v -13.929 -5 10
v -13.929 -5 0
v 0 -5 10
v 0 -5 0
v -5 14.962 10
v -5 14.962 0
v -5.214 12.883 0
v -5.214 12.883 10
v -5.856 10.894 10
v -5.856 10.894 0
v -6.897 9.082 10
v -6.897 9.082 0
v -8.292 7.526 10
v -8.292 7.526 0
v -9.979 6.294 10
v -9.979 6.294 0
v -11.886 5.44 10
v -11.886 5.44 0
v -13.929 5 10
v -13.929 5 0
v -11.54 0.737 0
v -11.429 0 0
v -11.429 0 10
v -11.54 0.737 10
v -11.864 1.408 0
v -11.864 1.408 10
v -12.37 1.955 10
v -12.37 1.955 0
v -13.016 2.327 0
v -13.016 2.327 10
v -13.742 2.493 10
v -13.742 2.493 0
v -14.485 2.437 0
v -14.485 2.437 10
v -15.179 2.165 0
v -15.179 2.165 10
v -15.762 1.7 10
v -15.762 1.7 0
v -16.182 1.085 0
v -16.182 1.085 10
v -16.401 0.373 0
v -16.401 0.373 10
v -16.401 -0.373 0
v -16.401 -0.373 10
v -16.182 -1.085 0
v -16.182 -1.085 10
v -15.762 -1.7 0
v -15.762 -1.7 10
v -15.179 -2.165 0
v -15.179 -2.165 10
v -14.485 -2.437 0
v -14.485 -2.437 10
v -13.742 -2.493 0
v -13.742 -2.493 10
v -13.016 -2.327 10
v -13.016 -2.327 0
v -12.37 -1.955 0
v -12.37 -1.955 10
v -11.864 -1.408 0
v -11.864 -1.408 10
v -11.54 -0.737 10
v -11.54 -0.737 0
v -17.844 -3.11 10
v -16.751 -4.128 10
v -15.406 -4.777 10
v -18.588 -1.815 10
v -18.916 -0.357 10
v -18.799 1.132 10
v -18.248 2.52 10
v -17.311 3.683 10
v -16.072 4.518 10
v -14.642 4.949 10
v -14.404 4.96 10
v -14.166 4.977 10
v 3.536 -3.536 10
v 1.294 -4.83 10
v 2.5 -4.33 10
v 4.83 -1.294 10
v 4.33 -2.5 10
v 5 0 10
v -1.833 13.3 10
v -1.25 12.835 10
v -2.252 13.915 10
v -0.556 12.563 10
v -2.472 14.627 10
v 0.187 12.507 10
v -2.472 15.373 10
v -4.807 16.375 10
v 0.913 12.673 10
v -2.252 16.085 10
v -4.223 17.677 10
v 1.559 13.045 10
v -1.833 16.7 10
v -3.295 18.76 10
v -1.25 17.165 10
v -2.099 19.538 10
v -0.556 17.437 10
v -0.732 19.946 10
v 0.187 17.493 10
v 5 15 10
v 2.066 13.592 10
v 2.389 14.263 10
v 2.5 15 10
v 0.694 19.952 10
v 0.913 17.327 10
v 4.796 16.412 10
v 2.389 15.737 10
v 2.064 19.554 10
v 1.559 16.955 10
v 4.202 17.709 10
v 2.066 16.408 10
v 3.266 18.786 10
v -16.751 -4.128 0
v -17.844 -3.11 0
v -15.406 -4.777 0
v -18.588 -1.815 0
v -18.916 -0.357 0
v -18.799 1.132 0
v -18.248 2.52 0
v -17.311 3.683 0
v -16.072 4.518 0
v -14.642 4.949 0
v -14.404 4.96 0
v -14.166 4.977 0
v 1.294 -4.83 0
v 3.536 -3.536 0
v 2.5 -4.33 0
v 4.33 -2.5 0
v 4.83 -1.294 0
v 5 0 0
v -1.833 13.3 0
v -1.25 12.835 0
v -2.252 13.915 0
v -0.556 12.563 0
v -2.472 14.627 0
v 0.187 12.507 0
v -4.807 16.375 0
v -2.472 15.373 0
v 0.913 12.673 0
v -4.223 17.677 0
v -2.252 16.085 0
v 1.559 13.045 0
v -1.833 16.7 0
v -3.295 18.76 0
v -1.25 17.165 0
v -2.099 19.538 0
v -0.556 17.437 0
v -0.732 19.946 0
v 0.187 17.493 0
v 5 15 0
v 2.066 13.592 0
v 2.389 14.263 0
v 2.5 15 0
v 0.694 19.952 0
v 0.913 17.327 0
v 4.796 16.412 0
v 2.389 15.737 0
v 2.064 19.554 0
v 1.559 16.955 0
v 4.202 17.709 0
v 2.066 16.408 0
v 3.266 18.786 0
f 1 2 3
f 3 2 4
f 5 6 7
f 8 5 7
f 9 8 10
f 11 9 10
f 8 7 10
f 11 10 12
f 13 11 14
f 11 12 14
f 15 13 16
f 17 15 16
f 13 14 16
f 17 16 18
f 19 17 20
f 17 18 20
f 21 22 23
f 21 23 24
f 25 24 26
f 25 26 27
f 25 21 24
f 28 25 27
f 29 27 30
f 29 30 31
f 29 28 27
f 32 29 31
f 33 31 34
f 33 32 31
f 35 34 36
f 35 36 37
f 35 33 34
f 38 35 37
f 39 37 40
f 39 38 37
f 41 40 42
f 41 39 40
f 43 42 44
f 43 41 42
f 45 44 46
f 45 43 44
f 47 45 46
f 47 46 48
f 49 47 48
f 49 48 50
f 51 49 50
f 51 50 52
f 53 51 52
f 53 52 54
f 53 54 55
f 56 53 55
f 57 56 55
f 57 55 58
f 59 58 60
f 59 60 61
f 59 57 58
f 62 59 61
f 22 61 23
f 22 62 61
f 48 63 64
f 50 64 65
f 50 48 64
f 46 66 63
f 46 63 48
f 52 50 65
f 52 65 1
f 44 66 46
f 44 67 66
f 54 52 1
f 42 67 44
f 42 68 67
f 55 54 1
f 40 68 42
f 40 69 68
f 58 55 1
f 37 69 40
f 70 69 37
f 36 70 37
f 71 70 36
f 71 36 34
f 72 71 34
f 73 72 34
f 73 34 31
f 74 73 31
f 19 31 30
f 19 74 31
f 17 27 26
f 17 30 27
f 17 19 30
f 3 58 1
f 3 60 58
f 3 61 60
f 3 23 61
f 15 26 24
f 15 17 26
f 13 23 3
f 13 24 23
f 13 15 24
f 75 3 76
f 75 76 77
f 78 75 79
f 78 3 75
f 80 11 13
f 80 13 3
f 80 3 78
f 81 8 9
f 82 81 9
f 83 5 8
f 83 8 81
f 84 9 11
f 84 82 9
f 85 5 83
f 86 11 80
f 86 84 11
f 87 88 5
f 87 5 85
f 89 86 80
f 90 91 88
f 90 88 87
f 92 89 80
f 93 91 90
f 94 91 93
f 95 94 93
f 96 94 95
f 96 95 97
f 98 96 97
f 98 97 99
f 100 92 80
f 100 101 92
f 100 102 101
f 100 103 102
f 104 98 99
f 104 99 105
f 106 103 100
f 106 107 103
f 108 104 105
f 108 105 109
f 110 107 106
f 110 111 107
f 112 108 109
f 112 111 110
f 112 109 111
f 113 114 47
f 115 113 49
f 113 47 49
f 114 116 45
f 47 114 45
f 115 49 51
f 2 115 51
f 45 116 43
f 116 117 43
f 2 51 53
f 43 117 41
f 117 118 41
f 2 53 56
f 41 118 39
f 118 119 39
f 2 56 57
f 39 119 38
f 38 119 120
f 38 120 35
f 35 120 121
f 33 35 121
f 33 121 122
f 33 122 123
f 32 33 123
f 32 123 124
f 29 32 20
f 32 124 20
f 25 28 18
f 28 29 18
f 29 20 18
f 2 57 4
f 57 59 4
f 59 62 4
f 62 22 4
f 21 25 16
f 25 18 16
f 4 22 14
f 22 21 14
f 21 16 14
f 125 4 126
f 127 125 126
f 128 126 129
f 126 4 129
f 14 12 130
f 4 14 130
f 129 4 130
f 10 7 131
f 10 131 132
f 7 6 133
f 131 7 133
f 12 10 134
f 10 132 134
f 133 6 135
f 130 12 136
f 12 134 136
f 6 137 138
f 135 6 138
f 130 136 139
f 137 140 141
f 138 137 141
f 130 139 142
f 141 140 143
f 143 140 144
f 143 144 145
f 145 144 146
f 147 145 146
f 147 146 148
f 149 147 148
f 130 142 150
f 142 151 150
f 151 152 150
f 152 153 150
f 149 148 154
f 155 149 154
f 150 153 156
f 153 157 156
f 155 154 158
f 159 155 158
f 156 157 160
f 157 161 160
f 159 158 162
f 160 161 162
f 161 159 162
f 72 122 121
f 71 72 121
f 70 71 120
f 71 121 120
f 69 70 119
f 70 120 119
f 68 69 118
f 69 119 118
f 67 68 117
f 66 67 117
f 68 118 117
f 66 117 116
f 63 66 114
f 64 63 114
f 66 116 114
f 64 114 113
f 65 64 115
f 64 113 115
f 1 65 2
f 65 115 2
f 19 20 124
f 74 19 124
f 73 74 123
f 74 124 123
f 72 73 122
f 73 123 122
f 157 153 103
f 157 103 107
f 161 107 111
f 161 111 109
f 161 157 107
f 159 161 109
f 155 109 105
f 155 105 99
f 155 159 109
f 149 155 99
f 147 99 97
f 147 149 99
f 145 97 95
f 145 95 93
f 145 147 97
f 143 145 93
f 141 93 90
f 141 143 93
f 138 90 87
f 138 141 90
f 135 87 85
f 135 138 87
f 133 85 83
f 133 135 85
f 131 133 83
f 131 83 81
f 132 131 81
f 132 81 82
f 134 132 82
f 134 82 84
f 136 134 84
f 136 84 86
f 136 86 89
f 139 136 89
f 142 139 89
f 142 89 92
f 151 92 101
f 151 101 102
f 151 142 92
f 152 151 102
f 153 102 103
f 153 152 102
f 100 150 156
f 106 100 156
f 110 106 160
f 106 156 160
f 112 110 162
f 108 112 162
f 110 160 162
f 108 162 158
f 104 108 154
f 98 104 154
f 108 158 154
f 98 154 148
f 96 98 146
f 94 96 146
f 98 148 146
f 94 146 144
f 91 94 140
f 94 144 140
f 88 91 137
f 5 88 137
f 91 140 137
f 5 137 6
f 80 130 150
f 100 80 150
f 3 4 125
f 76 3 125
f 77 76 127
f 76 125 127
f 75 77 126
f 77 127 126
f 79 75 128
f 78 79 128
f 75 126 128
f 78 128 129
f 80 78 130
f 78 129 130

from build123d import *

# Parameters (mm, degrees)
F0_R     = 2.5
F1_DEPTH = 10


with BuildPart() as f1:
    # F0 (on Top) → F1 (new body)
    with BuildSketch(Plane.XY):
        with BuildLine():
            ThreePointArc((0, -5), (-3.5355339059, 3.5355339059), (5, 0))
            Line((5, 0), (5, 15))
            ThreePointArc((5, 15), (0, 10), (-5, 15))
            ThreePointArc((-5, 15), (-7.5406677948, 8.2821226215), (-13.9291371274, 5))
            ThreePointArc((-13.9291371274, 5), (-10.3936032215, 3.5355339059), (-8.9291371274, 0))
            ThreePointArc((-8.9291371274, 0), (-10.3936032215, -3.5355339059), (-13.9291371274, -5))
            Line((-13.9291371274, -5), (0, -5))
        make_face()
        with BuildLine():
            ThreePointArc((-14.6420213859, 4.9489186732), (-18.9163504458, -0.3573560088), (-13.9291371274, -5))
            ThreePointArc((-13.9291371274, -5), (-10.3936032215, -3.5355339059), (-8.9291371274, 0))
            ThreePointArc((-8.9291371274, 0), (-10.3936032215, 3.5355339059), (-13.9291371274, 5))
            ThreePointArc((-13.9291371274, 5), (-14.2851227554, 4.9680884652), (-14.6420213859, 4.9489186732))
        make_face()
        with Locations((-13.9291371274, 0)):
            Circle(F0_R, mode=Mode.SUBTRACT)
        with BuildLine():
            ThreePointArc((0, -5), (3.5355339059, -3.5355339059), (5, 0))
            ThreePointArc((5, 0), (-3.5355339059, 3.5355339059), (0, -5))
        make_face()
        with BuildLine():
            ThreePointArc((5, 15), (0, 20), (-5, 15))
            ThreePointArc((-5, 15), (0, 10), (5, 15))
        make_face()
        with Locations((0, 15)):
            Circle(F0_R, mode=Mode.SUBTRACT)
    extrude(amount=F1_DEPTH)


solid = f1.part
